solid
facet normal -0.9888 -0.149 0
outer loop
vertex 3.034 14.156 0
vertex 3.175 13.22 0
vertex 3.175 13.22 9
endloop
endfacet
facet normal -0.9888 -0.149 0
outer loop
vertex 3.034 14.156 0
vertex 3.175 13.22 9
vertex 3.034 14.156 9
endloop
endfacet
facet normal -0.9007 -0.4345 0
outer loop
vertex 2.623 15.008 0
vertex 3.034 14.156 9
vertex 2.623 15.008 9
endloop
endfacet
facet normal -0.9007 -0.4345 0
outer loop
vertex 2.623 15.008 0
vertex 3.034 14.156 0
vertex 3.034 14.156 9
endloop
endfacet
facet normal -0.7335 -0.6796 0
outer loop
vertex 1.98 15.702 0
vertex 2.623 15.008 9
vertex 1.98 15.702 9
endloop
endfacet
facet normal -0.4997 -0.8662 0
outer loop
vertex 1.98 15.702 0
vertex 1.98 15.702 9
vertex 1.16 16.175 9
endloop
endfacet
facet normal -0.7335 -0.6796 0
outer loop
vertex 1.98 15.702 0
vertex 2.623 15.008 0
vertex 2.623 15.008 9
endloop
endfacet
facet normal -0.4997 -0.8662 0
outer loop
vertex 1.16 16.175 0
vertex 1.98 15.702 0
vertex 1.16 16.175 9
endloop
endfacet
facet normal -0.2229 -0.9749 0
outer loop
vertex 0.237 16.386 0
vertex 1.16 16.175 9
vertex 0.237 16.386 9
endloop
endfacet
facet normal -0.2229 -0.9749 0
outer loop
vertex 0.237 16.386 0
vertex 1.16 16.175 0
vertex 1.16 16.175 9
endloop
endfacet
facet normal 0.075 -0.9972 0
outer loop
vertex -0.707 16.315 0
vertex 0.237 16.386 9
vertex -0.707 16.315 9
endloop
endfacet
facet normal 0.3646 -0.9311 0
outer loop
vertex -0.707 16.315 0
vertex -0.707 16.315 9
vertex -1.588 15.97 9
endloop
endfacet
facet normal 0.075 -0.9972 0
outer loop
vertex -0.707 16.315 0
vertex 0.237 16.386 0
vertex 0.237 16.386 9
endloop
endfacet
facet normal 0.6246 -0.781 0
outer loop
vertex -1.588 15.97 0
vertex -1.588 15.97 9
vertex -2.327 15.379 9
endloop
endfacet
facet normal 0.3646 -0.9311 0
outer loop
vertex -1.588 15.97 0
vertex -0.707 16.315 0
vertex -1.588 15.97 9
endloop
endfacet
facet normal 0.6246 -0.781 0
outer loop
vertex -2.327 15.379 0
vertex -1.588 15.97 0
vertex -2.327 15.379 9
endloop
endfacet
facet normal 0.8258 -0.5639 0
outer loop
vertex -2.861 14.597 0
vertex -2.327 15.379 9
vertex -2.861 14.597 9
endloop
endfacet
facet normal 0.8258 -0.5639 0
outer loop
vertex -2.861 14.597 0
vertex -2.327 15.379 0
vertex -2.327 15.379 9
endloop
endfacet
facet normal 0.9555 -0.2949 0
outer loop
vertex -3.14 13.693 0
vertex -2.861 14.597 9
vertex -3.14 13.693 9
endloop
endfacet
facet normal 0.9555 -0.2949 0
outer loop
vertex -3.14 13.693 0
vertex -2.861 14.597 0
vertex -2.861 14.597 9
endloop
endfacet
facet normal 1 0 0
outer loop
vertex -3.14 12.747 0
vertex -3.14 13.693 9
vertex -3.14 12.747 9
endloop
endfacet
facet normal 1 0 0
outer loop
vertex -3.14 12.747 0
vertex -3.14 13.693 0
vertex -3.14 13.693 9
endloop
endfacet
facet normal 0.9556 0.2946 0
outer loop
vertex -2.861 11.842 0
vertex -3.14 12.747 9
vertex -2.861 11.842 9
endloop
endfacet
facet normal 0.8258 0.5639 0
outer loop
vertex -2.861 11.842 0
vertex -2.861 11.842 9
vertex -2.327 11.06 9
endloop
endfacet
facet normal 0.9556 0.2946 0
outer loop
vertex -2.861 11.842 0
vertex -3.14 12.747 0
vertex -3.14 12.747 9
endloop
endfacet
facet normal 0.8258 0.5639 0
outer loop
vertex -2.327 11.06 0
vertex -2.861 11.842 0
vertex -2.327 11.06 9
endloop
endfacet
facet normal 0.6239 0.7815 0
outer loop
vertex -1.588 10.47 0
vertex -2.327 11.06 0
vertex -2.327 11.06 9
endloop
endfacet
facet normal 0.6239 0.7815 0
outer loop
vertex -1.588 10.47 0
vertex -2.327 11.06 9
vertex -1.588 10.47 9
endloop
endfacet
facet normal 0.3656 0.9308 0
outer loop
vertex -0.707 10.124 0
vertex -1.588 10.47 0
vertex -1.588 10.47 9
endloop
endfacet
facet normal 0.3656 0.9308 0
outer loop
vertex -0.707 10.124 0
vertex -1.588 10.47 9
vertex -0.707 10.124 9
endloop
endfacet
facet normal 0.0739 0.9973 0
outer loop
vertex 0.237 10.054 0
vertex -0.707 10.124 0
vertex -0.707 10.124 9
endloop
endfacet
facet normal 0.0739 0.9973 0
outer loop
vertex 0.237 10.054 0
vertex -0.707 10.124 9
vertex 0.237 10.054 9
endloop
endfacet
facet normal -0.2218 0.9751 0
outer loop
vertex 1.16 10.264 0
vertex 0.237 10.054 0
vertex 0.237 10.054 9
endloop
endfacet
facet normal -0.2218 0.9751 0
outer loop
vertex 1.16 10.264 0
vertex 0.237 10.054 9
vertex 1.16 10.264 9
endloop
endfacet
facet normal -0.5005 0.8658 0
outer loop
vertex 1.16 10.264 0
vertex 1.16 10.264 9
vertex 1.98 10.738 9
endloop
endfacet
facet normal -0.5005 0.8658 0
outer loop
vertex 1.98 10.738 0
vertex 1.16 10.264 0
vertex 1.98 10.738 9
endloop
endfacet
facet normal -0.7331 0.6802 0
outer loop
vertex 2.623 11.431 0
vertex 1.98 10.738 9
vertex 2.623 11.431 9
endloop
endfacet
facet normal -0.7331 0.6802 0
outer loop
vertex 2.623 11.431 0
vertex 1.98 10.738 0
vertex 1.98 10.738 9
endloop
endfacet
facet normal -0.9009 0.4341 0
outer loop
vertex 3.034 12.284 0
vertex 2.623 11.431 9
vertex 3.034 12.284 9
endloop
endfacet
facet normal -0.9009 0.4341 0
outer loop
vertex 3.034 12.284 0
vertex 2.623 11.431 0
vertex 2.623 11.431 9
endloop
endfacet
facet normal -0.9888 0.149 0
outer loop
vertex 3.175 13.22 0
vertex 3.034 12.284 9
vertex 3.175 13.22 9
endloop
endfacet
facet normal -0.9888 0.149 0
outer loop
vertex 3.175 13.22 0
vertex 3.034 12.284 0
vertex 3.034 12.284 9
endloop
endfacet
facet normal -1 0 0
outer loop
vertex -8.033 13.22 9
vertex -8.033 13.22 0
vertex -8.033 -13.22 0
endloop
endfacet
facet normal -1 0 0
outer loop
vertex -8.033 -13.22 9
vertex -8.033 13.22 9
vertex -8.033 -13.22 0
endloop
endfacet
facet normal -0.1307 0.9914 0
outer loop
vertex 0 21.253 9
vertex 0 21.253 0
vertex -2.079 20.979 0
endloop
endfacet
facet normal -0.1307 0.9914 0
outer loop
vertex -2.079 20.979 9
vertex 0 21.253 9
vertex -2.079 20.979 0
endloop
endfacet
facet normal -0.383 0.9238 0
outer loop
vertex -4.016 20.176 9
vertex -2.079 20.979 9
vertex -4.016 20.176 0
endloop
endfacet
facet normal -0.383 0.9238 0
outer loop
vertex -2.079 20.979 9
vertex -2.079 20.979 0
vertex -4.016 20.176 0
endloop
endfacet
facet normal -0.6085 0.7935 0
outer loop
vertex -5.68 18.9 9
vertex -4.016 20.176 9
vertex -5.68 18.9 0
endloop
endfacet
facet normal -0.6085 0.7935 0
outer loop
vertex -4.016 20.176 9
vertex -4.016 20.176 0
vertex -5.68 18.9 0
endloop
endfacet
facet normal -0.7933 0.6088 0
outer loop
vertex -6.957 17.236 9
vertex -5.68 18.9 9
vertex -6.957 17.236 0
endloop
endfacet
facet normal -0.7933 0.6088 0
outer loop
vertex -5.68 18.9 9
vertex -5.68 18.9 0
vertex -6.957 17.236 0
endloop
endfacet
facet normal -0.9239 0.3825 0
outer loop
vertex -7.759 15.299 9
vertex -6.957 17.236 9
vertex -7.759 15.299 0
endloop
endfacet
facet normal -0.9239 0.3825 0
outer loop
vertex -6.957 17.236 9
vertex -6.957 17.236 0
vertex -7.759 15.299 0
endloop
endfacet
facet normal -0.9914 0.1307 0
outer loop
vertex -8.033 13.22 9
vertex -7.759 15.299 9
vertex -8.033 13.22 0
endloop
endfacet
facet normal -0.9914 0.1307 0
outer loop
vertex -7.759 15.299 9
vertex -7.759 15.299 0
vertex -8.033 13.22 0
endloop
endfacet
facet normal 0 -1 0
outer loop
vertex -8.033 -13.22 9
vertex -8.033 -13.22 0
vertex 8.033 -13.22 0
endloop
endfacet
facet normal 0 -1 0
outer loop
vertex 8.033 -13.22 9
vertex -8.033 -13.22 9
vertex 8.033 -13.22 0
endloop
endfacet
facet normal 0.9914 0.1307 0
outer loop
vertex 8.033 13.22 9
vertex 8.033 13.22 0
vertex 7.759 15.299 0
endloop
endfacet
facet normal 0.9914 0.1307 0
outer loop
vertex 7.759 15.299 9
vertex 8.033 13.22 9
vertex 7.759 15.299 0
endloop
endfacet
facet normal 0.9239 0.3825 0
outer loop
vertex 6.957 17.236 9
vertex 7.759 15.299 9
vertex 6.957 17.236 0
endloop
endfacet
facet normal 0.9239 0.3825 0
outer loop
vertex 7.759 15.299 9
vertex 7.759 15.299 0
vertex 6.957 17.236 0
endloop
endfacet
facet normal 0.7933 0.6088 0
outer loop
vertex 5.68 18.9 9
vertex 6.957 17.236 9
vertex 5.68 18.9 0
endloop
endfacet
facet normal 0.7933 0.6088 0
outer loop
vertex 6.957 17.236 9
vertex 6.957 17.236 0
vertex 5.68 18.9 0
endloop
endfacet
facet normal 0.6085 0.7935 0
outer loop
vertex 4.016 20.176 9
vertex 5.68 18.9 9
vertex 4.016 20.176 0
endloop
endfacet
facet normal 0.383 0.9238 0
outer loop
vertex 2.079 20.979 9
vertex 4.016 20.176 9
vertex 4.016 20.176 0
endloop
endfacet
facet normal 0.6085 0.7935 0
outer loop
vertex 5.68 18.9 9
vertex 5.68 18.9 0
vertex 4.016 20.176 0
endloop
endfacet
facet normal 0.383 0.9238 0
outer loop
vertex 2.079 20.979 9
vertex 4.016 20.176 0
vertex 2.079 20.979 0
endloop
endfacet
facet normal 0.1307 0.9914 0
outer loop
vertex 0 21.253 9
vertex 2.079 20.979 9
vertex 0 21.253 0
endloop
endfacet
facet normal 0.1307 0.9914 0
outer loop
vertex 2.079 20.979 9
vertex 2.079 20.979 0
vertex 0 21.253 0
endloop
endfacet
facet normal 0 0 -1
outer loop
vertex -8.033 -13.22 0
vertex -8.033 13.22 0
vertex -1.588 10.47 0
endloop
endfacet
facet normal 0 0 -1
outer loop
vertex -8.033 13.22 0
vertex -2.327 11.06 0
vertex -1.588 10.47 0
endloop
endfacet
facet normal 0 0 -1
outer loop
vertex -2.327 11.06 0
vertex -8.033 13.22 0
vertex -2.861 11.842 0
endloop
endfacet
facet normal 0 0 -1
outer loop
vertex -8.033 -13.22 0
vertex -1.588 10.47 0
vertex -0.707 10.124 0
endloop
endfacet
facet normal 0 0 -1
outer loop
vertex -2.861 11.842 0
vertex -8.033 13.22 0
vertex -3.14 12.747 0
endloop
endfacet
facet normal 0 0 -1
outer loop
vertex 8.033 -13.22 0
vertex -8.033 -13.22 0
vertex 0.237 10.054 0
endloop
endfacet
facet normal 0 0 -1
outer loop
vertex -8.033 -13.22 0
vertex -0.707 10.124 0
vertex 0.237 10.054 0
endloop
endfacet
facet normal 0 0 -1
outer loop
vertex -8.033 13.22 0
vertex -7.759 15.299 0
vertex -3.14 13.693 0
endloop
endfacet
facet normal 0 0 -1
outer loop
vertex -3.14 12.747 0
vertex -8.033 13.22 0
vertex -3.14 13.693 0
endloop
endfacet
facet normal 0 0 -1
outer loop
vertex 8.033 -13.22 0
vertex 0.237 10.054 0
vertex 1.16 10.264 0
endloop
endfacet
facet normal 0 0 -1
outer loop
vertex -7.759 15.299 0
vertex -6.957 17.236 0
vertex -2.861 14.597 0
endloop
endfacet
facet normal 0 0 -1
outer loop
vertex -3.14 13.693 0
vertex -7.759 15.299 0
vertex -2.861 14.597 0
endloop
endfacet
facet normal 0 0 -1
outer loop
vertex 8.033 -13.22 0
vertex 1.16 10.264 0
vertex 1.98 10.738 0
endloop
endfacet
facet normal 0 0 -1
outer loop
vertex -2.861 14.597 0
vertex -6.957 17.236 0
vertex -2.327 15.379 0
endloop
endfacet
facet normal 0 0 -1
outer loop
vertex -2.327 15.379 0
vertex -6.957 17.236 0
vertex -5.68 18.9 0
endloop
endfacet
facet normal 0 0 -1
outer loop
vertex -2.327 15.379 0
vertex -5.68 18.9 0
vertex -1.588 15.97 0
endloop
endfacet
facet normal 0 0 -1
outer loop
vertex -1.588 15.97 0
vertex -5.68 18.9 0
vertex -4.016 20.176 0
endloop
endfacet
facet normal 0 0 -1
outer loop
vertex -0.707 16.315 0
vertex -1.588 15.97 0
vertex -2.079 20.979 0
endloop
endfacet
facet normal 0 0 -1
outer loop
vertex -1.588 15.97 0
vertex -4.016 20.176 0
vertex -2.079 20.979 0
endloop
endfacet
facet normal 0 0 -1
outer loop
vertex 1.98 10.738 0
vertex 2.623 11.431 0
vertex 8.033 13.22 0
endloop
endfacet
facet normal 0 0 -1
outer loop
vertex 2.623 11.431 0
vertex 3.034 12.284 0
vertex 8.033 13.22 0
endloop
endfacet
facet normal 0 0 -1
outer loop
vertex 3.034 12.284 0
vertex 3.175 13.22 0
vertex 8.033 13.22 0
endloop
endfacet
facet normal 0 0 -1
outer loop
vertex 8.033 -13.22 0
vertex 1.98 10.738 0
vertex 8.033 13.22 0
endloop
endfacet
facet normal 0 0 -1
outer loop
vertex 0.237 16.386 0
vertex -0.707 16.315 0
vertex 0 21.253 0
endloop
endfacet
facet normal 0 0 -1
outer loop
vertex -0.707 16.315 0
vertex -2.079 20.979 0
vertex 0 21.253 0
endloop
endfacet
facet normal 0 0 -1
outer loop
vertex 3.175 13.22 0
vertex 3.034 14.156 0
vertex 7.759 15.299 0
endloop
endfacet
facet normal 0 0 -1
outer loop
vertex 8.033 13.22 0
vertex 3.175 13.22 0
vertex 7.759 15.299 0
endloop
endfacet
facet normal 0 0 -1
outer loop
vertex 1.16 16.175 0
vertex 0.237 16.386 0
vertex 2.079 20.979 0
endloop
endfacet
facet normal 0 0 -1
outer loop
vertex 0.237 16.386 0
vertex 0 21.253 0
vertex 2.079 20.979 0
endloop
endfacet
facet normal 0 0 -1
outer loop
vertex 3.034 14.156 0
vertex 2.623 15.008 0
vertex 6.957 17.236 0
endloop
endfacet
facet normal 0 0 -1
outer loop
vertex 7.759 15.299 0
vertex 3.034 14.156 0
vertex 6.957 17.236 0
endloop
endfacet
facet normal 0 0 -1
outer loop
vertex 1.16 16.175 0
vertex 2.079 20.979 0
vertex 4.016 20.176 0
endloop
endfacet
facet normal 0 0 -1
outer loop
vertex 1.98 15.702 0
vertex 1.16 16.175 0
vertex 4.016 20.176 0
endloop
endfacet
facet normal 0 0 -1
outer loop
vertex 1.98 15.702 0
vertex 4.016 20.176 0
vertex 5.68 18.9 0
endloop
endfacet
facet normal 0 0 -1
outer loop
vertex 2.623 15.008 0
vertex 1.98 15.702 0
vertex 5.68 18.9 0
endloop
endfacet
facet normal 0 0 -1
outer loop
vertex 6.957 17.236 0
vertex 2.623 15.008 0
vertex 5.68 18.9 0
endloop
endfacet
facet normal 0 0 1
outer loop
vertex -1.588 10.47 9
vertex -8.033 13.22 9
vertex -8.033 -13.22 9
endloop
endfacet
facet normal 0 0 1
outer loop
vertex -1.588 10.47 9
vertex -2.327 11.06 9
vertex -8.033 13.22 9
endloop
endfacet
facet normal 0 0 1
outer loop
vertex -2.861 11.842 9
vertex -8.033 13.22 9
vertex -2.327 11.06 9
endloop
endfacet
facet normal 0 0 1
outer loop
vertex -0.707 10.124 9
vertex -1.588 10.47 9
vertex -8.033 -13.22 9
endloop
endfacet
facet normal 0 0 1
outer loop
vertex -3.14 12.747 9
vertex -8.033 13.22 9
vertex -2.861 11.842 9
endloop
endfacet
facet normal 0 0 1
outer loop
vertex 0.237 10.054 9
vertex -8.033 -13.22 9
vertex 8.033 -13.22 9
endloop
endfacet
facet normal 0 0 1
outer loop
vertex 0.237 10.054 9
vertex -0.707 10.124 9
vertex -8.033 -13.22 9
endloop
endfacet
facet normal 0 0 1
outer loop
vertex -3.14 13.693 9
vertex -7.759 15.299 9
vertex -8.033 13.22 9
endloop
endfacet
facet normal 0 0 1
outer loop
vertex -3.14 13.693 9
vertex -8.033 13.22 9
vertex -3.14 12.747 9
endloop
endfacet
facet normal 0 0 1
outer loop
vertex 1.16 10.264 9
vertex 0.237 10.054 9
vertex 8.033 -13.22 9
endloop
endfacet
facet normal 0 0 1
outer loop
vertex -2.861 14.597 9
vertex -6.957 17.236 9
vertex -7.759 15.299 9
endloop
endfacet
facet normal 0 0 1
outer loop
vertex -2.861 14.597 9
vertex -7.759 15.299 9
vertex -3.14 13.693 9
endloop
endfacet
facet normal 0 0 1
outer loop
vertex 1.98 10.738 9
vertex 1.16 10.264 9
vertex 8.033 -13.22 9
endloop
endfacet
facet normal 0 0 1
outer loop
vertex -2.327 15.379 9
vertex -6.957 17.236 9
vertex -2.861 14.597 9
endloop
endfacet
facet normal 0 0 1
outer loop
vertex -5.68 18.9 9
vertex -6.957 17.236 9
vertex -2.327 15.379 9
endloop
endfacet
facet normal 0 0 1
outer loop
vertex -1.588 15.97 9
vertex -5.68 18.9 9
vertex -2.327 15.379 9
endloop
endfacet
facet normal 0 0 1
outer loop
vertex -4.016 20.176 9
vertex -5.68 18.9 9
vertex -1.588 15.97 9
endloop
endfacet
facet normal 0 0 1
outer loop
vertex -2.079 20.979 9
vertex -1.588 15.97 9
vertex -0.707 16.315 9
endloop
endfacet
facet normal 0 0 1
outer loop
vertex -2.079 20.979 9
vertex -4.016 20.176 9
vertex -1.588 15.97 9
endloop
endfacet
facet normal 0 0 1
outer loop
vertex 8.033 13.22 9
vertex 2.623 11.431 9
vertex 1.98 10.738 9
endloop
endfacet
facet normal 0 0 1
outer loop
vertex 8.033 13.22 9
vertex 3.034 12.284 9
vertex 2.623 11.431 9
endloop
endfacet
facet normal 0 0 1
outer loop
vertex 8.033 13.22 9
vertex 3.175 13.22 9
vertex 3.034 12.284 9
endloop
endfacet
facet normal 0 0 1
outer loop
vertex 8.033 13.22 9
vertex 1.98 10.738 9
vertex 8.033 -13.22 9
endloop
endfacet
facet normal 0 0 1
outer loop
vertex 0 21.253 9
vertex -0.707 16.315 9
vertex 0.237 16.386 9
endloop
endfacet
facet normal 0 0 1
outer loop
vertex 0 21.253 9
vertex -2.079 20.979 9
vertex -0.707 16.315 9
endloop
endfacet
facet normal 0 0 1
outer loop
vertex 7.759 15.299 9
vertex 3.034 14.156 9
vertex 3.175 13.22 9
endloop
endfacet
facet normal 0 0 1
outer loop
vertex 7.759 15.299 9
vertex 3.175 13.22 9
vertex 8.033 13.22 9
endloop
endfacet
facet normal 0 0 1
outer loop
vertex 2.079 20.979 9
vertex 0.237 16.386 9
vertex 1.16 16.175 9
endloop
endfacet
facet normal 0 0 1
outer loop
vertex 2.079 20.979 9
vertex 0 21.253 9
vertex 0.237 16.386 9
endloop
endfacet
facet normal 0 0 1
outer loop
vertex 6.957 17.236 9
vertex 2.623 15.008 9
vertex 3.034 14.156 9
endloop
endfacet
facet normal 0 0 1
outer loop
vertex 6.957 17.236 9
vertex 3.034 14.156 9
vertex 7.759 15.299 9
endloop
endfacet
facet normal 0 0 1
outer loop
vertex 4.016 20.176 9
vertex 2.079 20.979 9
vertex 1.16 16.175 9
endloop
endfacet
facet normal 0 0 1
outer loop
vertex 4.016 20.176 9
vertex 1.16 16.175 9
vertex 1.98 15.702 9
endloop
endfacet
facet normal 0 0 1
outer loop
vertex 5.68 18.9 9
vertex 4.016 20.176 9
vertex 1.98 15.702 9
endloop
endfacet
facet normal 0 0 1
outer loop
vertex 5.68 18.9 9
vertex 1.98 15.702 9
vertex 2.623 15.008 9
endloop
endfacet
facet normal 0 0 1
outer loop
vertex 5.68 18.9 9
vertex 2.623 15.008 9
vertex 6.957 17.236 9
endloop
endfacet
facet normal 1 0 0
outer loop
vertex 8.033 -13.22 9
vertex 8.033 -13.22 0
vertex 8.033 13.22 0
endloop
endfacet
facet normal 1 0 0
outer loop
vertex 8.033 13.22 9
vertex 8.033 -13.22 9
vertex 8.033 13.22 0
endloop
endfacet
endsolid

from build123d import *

# Parameters (mm, degrees)
SKETCH1_R           = 3.175
BOSS_EXTRUDE1_DEPTH = 9


with BuildPart() as part:
    # Sketch1 → Boss-Extrude1 (new body)
    with BuildSketch(Plane.XY):
        with BuildLine():
            Line((-8.032782944, 13.219871482), (-8.032782944, -13.219871482))
            Line((-8.032782944, -13.219871482), (8.032782944, -13.219871482))
            Line((8.032782944, -13.219871482), (8.032782944, 13.219871482))
            ThreePointArc((8.032782944, 13.219871482), (5.680035292, 18.899906774), (0, 21.252654427))
            ThreePointArc((0, 21.252654427), (-5.680035292, 18.899906774), (-8.032782944, 13.219871482))
        make_face()
        with Locations((0, 13.219871482)):
            Circle(SKETCH1_R, mode=Mode.SUBTRACT)
    extrude(amount=BOSS_EXTRUDE1_DEPTH)


solid = part.part
